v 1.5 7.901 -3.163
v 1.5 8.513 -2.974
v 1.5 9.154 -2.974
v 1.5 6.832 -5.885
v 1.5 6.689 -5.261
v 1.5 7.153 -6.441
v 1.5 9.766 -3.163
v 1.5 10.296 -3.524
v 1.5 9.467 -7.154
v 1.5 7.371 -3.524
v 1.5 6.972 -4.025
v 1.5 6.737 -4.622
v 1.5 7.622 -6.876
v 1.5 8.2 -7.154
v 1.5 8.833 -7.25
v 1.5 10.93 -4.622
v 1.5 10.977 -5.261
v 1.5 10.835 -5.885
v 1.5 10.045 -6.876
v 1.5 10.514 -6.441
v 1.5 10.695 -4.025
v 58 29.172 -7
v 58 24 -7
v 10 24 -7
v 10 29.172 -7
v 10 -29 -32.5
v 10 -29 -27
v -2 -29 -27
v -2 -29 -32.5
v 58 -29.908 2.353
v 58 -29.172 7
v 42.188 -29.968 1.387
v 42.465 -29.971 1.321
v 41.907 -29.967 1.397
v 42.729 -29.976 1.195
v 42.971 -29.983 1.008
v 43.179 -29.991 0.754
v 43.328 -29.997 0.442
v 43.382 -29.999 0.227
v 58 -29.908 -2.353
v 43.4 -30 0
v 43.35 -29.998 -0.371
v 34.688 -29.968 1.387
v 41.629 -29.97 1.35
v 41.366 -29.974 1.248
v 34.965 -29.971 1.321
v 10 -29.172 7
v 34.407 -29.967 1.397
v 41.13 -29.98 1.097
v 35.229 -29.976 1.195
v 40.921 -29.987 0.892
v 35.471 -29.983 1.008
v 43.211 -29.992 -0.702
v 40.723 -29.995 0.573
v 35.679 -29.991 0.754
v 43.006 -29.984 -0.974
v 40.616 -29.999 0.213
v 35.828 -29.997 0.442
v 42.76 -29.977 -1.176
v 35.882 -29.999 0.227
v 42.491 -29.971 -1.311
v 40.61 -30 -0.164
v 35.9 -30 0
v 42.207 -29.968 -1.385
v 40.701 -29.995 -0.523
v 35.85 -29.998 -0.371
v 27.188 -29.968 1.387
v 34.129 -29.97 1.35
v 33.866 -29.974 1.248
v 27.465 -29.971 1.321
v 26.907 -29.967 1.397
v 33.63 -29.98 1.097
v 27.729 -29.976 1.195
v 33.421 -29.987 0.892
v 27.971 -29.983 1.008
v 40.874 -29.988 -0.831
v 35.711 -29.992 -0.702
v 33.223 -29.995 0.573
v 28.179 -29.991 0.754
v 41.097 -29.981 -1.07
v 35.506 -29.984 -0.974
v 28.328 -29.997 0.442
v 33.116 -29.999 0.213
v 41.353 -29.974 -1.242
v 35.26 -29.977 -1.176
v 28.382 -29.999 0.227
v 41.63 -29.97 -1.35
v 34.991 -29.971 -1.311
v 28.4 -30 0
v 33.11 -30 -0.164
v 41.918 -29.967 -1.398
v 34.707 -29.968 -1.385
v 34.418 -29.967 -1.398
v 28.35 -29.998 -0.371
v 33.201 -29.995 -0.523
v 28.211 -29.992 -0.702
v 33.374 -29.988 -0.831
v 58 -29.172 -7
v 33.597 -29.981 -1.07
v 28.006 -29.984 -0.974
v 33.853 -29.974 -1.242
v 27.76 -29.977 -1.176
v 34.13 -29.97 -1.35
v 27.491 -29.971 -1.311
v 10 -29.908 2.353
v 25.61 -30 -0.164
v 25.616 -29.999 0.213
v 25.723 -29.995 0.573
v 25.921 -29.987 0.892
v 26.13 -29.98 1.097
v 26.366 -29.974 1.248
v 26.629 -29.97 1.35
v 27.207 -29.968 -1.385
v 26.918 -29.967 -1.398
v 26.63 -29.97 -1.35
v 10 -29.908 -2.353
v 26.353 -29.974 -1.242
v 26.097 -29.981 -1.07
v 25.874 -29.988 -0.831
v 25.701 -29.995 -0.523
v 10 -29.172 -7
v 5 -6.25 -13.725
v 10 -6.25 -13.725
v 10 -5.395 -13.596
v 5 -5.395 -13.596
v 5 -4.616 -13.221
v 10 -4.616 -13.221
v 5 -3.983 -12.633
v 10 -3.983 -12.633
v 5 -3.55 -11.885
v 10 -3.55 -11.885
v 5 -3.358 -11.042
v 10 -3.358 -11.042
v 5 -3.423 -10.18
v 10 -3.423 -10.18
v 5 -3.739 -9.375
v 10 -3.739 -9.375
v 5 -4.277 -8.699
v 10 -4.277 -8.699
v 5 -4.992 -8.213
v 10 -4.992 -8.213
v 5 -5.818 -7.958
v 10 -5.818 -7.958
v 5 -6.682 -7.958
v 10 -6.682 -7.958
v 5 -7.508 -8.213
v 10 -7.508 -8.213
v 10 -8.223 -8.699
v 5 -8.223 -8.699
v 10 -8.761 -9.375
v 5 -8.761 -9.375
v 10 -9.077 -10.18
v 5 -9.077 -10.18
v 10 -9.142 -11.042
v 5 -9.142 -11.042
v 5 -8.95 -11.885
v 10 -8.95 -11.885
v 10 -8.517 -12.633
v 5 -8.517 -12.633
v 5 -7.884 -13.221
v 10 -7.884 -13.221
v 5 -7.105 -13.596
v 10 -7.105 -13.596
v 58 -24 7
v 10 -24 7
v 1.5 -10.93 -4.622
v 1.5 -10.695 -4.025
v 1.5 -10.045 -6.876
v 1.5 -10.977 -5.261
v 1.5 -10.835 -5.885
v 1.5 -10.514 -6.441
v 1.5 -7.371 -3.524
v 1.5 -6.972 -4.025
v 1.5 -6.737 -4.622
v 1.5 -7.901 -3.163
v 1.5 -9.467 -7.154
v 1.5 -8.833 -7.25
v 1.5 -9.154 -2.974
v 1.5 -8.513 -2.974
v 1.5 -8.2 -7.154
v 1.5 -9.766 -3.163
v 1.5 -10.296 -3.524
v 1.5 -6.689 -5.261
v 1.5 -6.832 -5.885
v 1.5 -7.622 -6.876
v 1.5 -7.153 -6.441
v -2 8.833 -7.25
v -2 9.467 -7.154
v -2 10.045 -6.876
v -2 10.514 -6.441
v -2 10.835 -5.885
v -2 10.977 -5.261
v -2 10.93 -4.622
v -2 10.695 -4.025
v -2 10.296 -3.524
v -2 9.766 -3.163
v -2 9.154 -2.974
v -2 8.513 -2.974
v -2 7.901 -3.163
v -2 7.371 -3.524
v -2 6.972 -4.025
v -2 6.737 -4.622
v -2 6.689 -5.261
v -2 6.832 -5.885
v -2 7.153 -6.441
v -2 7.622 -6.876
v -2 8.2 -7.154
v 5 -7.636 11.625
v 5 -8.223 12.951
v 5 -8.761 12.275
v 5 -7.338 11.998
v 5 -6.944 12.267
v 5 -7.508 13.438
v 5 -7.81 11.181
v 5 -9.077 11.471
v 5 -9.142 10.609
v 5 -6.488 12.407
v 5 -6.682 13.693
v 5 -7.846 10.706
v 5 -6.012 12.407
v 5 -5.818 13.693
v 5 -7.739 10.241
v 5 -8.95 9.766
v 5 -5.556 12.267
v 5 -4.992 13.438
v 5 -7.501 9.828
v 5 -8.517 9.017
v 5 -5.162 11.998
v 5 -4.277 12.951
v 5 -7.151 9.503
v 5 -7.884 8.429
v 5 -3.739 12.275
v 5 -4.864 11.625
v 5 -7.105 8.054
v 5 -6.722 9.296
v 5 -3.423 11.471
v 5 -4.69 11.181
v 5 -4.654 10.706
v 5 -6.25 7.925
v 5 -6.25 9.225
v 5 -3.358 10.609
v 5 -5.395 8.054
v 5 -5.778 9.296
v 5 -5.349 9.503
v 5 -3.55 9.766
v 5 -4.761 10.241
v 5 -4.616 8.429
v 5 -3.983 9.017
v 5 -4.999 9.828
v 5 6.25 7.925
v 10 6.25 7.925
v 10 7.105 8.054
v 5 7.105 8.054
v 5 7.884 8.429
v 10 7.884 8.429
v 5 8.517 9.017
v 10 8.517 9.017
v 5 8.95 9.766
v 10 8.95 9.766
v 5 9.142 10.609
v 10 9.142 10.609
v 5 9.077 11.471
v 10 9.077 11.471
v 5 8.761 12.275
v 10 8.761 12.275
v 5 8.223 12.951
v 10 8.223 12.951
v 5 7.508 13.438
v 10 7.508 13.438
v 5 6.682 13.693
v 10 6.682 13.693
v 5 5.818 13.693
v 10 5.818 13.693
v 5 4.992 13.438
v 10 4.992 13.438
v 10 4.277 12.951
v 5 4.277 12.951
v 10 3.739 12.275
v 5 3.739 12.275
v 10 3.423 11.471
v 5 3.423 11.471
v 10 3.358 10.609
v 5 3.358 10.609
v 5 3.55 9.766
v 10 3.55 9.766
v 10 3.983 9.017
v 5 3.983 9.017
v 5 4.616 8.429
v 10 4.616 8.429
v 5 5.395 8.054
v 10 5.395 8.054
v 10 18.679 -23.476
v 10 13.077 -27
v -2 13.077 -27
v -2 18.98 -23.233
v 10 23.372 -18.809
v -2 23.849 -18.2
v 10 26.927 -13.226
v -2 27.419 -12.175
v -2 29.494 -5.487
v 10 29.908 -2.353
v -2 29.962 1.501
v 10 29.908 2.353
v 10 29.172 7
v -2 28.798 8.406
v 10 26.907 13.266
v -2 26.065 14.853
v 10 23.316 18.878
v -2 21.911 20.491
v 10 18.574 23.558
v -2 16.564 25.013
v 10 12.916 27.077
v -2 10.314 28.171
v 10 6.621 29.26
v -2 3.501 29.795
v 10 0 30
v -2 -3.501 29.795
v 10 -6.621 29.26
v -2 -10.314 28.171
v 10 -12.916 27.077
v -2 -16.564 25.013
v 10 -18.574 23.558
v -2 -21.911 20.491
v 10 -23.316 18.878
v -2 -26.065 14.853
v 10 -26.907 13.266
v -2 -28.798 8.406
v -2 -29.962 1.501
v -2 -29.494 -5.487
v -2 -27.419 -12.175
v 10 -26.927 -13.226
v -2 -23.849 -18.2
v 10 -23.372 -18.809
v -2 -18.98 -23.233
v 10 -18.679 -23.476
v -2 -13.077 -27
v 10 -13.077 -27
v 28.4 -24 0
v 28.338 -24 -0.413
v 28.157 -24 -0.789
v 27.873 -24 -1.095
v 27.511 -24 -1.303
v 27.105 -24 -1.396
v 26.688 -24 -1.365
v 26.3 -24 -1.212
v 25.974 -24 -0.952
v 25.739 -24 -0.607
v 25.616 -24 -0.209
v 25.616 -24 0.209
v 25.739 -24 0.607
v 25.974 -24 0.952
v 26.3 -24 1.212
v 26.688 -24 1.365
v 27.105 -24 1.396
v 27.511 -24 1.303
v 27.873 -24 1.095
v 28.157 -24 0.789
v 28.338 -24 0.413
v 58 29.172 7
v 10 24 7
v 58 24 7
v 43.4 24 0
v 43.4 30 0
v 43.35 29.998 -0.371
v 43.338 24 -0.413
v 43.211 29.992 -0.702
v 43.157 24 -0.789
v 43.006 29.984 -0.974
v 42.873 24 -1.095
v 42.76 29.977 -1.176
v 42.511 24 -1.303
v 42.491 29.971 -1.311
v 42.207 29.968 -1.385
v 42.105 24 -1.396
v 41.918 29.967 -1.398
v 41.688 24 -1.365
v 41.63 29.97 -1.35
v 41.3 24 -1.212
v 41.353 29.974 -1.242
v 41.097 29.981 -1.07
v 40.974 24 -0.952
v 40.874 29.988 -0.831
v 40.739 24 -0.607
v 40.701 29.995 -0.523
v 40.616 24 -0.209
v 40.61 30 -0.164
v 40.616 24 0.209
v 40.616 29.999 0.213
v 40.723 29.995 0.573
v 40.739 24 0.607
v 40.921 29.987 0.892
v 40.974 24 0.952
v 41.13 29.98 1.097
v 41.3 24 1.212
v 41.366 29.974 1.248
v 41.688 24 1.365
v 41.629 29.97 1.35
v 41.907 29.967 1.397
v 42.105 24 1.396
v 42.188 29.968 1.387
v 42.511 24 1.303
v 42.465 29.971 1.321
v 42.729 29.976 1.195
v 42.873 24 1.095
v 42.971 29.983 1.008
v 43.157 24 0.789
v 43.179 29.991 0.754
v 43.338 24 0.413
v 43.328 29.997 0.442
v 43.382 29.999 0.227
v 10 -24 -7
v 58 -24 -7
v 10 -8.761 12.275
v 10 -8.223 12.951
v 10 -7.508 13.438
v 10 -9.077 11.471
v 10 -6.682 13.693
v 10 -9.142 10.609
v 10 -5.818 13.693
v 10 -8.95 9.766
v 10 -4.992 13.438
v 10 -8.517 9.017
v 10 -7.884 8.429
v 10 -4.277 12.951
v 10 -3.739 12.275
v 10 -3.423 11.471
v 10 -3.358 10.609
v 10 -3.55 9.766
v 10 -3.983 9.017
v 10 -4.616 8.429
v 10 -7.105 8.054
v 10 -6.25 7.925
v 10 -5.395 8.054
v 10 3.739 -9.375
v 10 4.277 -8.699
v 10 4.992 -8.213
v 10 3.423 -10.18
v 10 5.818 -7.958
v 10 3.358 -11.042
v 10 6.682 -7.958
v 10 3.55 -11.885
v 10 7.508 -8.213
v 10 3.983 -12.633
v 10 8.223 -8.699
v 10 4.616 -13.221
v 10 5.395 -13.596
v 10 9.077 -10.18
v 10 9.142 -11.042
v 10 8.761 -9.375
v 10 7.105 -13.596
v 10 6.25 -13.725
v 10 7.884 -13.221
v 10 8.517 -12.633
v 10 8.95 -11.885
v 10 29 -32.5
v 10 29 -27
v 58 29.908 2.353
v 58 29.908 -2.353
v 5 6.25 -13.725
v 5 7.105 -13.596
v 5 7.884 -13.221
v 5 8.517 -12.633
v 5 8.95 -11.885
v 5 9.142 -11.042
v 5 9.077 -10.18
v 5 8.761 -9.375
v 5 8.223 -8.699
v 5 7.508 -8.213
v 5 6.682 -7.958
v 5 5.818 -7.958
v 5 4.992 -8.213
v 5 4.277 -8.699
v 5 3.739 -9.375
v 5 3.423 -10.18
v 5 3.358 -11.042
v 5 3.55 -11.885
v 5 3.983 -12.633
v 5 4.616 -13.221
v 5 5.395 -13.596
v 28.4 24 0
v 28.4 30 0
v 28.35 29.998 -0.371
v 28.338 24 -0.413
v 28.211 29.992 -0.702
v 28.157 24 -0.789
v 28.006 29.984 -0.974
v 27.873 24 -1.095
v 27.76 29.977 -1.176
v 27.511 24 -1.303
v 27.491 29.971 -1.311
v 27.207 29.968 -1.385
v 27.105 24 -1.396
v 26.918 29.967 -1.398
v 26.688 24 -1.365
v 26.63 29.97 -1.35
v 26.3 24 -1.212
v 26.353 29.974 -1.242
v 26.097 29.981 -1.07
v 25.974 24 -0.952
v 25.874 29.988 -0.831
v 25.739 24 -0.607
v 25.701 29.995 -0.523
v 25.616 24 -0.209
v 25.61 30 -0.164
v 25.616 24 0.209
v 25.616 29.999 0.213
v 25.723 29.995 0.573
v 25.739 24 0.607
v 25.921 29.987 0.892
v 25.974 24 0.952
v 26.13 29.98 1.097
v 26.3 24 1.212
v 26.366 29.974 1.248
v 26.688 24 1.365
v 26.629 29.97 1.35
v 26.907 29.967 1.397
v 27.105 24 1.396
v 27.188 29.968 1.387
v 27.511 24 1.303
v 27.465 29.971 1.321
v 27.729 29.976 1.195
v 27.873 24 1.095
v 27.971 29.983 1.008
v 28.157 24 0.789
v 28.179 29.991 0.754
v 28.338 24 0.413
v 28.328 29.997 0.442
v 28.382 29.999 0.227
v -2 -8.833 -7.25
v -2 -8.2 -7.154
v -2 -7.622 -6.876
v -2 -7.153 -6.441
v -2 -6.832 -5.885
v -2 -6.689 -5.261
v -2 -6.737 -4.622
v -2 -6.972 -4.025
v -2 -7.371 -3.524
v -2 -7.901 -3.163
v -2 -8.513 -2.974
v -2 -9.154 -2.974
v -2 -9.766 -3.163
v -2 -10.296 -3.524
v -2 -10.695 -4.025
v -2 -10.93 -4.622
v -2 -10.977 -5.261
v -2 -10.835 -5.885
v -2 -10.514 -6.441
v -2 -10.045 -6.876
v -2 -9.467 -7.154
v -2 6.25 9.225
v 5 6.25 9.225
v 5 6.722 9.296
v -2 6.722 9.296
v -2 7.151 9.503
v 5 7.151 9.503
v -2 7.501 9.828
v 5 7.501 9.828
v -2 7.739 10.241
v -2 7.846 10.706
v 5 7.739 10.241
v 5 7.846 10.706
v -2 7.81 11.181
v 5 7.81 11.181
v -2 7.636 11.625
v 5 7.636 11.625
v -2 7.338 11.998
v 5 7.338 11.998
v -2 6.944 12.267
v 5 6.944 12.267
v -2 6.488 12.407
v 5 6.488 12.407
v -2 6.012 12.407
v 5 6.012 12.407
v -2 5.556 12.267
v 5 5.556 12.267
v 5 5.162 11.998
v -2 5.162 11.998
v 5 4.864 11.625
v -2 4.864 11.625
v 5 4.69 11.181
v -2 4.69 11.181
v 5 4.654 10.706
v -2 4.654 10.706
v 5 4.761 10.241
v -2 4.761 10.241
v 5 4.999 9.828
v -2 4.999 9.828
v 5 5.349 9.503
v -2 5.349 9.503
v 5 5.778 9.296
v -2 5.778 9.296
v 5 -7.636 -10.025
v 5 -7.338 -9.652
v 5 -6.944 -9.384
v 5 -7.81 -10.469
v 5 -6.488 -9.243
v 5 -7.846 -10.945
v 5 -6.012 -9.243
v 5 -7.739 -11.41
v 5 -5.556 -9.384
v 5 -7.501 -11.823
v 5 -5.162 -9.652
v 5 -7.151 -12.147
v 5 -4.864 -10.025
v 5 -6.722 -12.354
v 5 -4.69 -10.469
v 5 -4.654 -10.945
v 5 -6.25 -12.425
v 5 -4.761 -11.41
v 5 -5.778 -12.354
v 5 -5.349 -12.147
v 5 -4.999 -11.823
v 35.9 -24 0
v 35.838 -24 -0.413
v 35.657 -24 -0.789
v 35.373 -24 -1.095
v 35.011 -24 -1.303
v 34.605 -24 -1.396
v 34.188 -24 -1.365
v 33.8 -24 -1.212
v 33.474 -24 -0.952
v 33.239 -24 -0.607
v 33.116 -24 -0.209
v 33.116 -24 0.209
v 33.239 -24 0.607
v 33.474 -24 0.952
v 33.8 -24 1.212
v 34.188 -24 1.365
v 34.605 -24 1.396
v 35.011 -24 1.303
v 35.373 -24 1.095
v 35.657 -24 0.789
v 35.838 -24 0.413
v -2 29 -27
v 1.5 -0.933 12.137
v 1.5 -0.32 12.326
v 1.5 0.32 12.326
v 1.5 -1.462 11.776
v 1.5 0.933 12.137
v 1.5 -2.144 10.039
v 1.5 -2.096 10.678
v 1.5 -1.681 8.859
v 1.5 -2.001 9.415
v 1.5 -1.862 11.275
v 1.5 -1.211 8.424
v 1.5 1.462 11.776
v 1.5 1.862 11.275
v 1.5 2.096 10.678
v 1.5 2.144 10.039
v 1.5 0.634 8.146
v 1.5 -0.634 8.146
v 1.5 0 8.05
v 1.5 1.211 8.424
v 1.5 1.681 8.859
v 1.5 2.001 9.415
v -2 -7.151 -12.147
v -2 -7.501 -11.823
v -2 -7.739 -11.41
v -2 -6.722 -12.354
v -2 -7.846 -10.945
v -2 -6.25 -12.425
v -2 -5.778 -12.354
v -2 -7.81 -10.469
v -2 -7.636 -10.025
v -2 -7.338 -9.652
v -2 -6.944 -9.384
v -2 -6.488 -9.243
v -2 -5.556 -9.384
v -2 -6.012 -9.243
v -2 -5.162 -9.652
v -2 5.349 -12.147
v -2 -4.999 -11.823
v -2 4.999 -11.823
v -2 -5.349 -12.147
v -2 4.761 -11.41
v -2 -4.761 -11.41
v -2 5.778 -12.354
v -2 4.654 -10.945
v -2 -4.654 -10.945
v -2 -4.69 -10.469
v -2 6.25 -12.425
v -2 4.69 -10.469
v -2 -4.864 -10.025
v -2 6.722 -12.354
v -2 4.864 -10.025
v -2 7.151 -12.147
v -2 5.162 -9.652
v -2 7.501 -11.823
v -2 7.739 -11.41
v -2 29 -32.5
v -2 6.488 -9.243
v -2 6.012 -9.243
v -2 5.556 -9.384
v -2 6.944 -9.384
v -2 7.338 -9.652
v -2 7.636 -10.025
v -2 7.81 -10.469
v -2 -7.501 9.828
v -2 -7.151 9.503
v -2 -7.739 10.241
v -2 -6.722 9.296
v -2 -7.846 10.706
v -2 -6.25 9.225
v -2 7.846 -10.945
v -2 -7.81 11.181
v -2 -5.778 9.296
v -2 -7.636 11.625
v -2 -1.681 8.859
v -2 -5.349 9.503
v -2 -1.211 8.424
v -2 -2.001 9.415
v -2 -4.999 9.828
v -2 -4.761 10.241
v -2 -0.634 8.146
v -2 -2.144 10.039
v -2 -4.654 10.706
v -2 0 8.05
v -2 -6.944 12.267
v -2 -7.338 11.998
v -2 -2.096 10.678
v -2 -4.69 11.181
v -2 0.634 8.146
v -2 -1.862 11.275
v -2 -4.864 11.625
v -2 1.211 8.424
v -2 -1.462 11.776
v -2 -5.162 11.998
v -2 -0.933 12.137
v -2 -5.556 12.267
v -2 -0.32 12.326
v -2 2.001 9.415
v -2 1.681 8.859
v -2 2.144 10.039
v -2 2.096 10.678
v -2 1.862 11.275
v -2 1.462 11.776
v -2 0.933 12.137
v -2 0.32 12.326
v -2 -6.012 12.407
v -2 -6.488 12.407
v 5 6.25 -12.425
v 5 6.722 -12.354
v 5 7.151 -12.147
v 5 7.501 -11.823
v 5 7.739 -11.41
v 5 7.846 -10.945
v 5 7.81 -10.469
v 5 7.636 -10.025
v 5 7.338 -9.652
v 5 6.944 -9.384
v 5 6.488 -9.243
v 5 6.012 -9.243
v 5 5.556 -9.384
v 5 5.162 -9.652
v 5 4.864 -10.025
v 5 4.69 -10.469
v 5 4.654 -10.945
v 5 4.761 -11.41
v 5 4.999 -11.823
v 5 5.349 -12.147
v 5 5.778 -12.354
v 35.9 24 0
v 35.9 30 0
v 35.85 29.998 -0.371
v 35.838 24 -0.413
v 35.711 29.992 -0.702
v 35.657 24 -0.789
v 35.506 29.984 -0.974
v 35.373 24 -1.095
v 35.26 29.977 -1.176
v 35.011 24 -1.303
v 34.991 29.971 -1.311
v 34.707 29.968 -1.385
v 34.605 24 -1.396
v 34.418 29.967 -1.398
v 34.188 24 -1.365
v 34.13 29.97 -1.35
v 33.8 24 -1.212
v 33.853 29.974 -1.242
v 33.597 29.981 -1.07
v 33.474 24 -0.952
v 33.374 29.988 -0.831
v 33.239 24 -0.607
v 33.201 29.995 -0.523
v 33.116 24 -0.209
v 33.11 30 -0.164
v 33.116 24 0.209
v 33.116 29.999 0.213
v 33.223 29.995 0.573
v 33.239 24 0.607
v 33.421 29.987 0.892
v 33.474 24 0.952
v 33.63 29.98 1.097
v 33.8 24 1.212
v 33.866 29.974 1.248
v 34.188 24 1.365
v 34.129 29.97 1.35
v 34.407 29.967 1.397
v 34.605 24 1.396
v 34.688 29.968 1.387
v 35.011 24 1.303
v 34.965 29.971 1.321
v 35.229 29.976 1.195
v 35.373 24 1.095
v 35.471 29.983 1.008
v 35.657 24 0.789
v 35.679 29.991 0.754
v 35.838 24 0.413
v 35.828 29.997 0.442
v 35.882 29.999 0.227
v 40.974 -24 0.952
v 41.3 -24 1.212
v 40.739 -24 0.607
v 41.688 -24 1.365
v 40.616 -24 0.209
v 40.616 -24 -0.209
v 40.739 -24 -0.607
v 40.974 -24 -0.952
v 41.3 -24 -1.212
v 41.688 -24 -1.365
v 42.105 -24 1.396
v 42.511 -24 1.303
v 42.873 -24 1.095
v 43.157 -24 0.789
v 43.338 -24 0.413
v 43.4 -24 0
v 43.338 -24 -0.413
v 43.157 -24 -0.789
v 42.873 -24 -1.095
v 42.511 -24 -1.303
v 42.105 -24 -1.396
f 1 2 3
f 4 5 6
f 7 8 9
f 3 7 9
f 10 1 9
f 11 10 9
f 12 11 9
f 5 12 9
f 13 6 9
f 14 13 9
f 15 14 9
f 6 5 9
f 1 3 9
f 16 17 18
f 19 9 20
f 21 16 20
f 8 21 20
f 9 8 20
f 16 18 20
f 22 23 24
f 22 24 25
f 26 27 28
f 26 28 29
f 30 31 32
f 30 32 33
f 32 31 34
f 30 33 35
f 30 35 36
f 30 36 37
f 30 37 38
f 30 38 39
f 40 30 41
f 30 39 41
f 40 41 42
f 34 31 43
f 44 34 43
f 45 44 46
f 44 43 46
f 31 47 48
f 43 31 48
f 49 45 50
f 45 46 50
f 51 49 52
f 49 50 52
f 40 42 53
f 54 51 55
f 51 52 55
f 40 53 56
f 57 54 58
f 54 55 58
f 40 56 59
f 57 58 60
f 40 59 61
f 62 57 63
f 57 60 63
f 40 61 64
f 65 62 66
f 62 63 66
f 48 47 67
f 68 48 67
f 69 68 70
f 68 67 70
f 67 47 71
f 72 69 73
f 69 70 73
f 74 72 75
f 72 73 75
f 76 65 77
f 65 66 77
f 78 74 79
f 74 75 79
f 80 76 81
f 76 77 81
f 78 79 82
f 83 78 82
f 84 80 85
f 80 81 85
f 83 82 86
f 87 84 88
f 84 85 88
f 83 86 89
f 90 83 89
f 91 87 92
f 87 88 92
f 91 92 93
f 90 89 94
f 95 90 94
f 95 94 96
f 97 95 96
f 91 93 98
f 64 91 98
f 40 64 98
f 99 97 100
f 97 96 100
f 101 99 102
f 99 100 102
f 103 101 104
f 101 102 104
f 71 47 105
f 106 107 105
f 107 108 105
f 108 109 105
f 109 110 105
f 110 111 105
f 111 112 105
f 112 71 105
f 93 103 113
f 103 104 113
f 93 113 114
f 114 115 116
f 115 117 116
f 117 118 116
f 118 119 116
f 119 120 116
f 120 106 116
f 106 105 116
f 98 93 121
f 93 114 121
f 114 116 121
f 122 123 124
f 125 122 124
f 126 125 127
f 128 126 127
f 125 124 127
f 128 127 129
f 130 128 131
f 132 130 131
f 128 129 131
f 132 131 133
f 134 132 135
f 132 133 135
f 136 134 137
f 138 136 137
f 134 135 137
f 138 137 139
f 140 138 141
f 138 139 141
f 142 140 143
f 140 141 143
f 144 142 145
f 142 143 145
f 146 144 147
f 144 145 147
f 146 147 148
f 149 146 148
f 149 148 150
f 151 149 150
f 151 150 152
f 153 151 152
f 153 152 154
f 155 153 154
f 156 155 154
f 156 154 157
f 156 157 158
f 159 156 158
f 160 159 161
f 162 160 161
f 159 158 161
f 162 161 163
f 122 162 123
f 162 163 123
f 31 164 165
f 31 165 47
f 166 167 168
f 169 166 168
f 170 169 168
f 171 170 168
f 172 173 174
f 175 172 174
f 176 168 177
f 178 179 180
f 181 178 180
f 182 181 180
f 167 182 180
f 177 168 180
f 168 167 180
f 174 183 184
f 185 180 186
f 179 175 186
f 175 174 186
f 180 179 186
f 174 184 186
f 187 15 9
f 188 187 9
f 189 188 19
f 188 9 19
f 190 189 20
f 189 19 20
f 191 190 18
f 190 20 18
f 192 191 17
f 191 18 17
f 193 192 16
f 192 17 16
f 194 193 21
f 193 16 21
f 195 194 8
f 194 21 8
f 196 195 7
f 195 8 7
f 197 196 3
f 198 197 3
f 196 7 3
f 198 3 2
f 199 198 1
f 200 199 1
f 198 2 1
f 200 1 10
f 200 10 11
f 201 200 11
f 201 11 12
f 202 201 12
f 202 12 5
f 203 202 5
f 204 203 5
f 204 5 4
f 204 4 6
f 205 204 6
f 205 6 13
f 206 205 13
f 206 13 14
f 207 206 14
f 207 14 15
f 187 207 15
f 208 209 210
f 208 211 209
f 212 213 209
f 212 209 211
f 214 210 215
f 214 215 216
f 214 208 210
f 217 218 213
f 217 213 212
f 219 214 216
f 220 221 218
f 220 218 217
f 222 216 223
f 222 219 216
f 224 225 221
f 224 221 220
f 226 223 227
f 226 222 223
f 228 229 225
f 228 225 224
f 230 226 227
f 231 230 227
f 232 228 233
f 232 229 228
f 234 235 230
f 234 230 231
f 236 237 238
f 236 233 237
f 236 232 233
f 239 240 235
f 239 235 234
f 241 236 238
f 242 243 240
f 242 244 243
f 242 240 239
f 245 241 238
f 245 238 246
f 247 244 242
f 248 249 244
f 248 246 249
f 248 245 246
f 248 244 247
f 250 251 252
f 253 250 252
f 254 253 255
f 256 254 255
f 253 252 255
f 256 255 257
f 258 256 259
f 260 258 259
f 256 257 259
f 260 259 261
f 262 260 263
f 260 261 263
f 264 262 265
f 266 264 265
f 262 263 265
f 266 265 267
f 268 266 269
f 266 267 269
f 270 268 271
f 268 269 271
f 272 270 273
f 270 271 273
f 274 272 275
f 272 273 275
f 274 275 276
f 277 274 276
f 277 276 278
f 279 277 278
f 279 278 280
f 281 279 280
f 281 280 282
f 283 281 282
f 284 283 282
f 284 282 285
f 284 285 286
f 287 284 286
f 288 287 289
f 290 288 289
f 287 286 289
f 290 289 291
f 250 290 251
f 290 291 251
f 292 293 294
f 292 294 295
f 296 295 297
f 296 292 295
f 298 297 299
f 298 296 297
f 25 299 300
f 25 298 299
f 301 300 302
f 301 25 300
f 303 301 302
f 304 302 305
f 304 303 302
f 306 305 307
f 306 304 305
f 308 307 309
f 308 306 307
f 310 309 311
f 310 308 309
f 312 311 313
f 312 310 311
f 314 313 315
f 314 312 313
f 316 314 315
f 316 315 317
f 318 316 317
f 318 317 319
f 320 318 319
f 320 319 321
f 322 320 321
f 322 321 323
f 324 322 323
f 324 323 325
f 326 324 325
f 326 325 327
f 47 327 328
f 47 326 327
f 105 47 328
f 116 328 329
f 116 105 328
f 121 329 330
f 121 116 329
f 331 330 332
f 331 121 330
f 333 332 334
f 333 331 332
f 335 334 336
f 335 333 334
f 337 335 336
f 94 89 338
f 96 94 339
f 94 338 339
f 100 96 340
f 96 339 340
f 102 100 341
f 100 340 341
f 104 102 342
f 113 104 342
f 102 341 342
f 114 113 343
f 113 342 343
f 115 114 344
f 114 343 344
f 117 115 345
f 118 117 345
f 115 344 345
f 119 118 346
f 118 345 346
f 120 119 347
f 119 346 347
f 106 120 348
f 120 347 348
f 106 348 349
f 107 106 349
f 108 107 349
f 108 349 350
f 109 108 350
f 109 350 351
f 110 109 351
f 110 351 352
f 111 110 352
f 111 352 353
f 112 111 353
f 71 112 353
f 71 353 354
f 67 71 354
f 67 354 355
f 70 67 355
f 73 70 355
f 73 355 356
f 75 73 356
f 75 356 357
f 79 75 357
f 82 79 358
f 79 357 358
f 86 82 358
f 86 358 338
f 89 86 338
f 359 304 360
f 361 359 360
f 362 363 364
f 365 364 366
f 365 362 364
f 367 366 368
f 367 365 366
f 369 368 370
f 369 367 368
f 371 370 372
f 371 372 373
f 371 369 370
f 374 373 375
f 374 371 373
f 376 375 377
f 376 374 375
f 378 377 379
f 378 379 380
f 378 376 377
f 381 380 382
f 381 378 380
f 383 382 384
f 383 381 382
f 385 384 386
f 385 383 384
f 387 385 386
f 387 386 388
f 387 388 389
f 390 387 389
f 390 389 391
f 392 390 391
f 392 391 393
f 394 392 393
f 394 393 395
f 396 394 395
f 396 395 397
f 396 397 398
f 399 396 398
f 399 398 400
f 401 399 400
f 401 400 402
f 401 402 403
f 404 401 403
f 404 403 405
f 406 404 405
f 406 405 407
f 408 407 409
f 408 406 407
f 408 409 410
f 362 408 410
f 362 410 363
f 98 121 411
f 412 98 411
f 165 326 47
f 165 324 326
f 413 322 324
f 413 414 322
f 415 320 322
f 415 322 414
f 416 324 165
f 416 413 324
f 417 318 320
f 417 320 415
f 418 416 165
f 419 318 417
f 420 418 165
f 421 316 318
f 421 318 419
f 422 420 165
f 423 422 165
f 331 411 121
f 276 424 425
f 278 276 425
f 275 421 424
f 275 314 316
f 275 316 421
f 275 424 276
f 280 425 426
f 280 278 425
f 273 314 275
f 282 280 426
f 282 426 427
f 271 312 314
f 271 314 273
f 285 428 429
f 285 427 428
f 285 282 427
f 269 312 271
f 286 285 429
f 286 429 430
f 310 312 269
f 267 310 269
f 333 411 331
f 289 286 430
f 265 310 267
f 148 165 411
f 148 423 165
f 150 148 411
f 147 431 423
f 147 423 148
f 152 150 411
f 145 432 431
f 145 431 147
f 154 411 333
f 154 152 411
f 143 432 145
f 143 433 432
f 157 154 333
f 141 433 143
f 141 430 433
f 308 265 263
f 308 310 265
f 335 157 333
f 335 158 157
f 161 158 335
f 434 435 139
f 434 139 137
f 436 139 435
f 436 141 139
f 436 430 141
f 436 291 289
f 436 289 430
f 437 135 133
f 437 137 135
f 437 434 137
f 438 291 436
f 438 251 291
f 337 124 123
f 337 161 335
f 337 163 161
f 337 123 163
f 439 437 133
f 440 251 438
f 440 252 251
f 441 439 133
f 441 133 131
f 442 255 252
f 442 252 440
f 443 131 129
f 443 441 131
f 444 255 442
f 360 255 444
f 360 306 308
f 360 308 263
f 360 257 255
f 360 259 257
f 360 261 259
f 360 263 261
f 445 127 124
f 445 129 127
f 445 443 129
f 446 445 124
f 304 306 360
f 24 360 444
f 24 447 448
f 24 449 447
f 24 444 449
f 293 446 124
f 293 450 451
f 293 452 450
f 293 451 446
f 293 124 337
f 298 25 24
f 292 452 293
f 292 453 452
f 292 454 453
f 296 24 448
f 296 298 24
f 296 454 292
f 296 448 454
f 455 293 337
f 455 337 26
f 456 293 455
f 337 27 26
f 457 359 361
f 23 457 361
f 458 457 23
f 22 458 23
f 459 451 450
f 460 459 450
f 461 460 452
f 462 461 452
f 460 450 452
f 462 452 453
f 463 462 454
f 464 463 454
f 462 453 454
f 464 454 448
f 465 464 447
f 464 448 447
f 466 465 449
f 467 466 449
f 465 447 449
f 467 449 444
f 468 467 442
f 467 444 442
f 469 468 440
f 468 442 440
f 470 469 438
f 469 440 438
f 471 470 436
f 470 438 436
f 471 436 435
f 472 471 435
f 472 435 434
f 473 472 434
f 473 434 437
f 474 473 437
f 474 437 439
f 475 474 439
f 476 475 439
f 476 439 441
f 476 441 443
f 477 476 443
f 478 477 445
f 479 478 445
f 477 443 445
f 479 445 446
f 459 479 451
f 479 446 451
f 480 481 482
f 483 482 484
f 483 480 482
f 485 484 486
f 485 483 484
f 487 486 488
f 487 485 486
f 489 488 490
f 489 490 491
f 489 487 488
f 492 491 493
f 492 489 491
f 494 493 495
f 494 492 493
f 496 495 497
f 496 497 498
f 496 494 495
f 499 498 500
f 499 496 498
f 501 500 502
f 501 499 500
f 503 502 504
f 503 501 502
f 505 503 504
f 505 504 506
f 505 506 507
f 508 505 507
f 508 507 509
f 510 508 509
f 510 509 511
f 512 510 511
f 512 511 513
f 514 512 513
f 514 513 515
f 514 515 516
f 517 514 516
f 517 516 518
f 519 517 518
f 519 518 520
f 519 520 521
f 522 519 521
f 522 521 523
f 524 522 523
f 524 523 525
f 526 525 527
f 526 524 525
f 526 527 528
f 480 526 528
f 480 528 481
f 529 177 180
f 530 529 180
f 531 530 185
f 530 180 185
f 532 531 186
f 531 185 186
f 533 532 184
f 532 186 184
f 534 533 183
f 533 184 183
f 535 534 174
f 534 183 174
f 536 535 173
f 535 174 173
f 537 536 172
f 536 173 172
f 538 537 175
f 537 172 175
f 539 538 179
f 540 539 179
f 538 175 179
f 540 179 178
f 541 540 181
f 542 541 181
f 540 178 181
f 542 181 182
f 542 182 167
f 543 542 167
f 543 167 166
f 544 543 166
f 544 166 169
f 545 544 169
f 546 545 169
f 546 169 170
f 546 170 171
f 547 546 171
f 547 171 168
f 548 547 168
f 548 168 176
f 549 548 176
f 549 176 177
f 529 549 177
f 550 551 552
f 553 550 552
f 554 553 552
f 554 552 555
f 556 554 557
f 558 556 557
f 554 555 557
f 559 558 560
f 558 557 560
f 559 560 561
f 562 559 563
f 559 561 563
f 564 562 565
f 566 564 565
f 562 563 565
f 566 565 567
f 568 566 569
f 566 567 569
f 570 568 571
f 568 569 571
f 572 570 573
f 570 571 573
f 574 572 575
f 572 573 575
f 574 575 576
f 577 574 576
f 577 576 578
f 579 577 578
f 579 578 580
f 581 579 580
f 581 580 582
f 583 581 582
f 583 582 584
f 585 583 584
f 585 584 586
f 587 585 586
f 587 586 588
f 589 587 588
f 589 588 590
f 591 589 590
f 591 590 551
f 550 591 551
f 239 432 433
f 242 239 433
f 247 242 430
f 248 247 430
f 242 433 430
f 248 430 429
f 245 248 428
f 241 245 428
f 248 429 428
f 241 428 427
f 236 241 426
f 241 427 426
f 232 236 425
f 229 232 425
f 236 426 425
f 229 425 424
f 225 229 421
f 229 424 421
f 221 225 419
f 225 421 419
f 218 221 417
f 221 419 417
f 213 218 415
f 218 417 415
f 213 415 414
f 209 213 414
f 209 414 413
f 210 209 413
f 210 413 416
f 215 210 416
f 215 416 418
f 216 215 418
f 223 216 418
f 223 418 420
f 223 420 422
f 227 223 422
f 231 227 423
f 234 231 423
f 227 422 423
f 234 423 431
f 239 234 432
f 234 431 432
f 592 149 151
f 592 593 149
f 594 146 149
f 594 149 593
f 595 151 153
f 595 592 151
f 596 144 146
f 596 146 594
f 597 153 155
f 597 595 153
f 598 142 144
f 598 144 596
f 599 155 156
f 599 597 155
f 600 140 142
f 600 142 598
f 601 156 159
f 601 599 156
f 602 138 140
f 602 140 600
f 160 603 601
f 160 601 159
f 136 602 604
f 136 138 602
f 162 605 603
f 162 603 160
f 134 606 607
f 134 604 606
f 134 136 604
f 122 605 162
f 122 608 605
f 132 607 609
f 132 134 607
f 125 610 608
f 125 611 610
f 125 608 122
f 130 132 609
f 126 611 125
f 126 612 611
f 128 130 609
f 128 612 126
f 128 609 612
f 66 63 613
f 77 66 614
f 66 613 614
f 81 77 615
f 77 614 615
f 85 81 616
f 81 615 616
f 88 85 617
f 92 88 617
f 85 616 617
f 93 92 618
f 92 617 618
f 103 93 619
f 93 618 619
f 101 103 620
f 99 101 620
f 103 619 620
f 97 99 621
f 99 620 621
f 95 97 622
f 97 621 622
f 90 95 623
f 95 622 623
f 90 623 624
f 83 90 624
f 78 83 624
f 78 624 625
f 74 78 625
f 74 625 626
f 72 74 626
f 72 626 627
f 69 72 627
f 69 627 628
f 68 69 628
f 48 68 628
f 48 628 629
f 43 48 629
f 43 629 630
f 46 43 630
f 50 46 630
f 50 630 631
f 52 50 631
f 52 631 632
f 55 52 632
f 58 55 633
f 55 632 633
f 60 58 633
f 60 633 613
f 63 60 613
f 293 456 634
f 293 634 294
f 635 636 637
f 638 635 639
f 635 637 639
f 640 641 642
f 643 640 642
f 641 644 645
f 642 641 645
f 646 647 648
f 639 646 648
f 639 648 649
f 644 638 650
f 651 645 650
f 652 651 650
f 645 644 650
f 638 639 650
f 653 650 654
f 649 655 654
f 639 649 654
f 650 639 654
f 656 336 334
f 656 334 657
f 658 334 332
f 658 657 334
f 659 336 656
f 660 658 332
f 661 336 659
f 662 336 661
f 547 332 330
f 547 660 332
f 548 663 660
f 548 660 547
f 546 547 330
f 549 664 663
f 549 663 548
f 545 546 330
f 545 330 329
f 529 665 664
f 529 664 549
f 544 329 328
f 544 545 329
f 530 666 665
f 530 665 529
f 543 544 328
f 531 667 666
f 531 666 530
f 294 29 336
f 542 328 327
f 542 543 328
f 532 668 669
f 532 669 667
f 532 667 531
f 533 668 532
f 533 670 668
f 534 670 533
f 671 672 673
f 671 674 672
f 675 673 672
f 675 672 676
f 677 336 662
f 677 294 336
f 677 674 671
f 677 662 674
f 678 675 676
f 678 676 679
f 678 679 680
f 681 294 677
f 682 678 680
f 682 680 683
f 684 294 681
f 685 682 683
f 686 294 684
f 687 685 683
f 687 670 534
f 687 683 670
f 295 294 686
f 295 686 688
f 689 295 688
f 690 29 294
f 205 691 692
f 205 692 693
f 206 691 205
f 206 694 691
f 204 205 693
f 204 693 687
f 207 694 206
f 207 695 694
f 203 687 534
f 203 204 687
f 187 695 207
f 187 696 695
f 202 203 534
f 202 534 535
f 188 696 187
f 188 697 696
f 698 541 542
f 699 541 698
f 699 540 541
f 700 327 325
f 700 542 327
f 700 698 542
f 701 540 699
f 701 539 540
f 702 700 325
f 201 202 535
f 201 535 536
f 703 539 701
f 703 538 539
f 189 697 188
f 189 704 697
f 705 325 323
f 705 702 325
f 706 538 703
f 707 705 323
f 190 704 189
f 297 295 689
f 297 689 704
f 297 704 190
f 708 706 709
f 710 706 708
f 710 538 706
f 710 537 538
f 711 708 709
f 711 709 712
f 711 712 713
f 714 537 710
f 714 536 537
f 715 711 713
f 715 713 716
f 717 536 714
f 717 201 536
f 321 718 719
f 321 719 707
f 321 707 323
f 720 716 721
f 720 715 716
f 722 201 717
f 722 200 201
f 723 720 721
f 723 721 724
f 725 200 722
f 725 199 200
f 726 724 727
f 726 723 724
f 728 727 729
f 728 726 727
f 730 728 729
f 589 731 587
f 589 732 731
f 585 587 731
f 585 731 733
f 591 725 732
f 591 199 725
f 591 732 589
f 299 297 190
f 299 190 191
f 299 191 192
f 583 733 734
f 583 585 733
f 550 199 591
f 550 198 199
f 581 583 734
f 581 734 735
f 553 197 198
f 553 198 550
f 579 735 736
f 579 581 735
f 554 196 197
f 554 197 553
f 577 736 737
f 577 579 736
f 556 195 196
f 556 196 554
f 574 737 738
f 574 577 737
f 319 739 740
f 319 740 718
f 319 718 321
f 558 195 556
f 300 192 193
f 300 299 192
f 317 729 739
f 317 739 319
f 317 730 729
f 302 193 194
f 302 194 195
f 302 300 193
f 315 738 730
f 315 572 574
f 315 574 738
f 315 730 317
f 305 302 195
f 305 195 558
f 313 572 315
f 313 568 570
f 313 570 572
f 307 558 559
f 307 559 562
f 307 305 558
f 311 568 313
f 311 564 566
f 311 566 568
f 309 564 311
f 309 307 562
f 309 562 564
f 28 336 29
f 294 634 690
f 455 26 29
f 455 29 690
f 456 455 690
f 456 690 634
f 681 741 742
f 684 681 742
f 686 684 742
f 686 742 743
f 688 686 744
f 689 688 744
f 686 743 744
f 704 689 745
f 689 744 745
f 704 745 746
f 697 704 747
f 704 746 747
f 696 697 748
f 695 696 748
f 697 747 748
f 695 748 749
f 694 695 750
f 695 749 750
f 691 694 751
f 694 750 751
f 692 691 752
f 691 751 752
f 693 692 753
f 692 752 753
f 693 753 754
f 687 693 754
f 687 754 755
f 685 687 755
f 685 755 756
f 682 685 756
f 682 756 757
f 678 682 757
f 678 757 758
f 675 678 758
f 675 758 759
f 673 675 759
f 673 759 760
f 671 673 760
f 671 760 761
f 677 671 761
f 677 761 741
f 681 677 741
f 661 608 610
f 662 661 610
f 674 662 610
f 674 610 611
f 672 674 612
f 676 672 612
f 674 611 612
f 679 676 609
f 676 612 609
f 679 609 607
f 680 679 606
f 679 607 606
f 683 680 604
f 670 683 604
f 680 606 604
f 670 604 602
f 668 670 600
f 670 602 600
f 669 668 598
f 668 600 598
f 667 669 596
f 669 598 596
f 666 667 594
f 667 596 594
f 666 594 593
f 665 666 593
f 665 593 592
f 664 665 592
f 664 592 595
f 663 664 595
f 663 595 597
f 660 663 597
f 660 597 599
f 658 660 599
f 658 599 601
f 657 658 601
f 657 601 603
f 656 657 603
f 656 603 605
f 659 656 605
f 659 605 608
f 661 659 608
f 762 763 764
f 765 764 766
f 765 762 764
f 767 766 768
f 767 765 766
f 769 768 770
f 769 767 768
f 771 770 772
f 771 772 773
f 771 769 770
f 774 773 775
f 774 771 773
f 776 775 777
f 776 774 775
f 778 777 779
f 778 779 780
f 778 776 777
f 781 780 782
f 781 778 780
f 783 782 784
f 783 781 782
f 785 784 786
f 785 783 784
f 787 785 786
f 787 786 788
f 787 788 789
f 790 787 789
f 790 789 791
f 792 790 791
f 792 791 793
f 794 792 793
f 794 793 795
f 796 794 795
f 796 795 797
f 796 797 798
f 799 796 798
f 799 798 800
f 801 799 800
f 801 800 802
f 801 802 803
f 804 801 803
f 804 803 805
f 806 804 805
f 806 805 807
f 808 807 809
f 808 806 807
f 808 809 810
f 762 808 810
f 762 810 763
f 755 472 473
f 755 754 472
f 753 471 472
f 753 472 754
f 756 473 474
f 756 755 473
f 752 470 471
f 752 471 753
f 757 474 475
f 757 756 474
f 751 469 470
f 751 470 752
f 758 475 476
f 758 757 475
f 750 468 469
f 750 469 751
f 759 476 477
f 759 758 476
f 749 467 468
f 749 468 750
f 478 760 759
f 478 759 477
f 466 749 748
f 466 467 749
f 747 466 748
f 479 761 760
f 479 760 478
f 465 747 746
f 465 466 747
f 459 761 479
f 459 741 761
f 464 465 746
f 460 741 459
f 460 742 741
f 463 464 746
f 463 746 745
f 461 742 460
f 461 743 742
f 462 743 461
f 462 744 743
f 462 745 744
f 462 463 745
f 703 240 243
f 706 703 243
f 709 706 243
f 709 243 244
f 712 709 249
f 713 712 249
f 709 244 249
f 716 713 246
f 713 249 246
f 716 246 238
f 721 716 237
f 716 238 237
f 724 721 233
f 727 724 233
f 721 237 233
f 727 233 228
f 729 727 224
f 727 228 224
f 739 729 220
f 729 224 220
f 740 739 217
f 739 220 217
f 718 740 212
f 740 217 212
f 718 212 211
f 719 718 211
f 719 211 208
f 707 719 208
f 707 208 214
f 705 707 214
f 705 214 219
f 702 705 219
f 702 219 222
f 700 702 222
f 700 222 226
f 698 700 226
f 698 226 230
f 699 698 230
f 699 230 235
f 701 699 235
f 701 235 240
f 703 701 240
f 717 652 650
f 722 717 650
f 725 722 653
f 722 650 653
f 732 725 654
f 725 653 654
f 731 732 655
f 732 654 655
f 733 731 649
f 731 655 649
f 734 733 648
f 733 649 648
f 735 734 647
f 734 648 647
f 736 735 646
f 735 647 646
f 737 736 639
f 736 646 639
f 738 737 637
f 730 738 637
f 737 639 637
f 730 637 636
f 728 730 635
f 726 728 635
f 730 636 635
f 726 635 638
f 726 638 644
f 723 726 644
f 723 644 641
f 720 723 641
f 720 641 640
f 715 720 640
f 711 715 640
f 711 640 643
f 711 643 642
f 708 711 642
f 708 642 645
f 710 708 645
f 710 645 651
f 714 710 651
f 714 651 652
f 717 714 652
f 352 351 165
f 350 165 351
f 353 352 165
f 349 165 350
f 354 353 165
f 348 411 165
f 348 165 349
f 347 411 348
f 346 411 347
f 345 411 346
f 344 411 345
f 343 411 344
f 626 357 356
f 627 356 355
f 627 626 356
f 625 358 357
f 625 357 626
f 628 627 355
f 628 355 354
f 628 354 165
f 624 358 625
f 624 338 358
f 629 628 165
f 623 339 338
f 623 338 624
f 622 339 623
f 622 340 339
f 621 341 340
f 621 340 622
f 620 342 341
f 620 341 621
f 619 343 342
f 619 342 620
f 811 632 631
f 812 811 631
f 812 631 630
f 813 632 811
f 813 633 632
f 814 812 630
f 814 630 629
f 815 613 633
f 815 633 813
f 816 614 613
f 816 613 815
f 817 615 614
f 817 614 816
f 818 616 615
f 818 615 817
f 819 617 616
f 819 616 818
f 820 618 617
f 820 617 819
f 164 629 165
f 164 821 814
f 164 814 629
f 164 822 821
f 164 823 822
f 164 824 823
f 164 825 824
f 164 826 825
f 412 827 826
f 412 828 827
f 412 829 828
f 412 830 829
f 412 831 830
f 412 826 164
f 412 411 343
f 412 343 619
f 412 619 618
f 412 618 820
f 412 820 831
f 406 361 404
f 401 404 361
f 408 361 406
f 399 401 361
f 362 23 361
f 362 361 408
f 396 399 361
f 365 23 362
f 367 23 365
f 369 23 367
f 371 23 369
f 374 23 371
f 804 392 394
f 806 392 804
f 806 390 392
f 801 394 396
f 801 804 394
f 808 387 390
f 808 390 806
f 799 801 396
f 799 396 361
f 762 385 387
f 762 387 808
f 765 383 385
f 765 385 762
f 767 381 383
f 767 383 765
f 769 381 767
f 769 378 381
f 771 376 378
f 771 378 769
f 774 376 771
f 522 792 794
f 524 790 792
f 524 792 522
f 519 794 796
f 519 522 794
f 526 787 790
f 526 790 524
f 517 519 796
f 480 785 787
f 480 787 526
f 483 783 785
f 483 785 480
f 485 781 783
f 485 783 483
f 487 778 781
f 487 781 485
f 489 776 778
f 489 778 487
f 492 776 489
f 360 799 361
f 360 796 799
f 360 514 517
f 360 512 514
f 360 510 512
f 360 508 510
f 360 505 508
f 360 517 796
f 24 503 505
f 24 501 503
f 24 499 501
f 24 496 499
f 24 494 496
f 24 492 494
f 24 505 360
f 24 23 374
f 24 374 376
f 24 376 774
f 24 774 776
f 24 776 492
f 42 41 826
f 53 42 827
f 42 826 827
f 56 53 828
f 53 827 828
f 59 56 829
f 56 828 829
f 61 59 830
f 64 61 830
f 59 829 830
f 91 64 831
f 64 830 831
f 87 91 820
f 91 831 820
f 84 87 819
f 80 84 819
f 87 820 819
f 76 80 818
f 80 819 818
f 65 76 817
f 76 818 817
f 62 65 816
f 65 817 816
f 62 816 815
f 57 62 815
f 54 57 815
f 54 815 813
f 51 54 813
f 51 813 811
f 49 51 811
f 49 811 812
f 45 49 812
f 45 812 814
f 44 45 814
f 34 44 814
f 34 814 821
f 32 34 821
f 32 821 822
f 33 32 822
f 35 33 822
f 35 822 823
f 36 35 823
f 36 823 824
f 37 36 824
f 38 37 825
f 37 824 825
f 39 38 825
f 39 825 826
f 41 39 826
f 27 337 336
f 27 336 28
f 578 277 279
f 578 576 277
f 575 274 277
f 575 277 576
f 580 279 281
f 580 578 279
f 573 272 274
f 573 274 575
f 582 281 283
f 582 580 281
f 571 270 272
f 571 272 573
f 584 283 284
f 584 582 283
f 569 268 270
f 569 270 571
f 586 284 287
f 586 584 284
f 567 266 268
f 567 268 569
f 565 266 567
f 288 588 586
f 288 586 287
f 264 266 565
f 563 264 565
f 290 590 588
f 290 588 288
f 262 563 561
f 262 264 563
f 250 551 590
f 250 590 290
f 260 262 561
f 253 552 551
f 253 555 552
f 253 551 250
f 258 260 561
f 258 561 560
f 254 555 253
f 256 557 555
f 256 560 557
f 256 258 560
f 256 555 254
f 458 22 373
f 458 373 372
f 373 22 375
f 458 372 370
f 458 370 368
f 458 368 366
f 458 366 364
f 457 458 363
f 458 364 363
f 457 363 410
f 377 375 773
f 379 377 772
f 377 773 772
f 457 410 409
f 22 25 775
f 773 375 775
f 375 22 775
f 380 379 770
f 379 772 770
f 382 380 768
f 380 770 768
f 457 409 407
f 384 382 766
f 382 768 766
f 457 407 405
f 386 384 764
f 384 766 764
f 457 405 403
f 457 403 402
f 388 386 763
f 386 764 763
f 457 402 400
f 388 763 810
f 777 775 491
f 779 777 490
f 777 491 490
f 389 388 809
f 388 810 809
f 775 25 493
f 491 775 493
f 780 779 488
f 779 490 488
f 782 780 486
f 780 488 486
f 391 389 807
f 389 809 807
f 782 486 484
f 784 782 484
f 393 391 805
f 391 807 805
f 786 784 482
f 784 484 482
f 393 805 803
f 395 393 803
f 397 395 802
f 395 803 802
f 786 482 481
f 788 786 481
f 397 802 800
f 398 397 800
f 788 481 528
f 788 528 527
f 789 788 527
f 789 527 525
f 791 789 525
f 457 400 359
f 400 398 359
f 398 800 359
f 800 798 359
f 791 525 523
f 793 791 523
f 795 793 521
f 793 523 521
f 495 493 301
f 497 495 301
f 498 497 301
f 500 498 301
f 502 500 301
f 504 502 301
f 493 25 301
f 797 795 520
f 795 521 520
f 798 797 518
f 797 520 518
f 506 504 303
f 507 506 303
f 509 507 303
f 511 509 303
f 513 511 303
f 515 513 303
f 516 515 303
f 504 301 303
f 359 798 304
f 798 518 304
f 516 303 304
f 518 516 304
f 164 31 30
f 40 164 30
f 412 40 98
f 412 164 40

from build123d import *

# Parameters (mm, degrees)
SKETCH_23_R                      = 1.6
SKETCH_23_R_2                    = 2.15
EXTRUDE_9_DEPTH                  = 12
SKETCH_25_R                      = 3.199536645
SKETCH_25_R_2                    = 3.253572192
SKETCH_25_R_3                    = 3.504037636
EXTRUDE_11_DEPTH                 = 8.5
SKETCH_27_R                      = 2.9
CUT_EXTRUDE_14_DEPTH             = 15
CUT_EXTRUDE_14_DEPTH_BACK        = 5
EXTRUDE_14_DEPTH                 = 48
EXTRUDE_14_DEPTH_BACK            = 8.5
EXTRUDE_15_REACH                 = 62
SKETCH_30_R                      = 2.823102459
SKETCH_30_R_2                    = 3.099807243
CUT_EXTRUDE_15_DEPTH             = 38
CUT_EXTRUDE_16_REACH             = 8
SKETCH_33_R                      = 1.4
CUT_EXTRUDE_16_DIRECTION_2_REACH = 56


with BuildPart() as part:
    # 草图23 → 凸台-拉伸9 (new body)
    with BuildSketch(Plane(origin=(10, 0, 0), x_dir=(0, 0, -1), z_dir=(1, 0, 0))):
        with BuildLine():
            Line((32.5, 0), (32.5, 29))
            Line((32.5, 29), (27, 29))
            Line((27, 29), (27, 13.076696831))
            ThreePointArc((27, 13.076696831), (-30, 0), (27, -13.076696831))
            Line((27, -13.076696831), (27, -29))
            Line((27, -29), (32.5, -29))
            Line((32.5, -29), (32.5, 0))
        make_face()
        with Locations((0, 12.5)):
            Circle(SKETCH_23_R, mode=Mode.SUBTRACT)
        with Locations((-10.825317547, 6.25)):
            Circle(SKETCH_23_R, mode=Mode.SUBTRACT)
        with Locations((10.825317547, 6.25)):
            Circle(SKETCH_23_R, mode=Mode.SUBTRACT)
        with Locations((10.825317547, -6.25)):
            Circle(SKETCH_23_R, mode=Mode.SUBTRACT)
        with Locations((0, -12.5)):
            Circle(SKETCH_23_R, mode=Mode.SUBTRACT)
        with Locations((-10.825317547, -6.25)):
            Circle(SKETCH_23_R, mode=Mode.SUBTRACT)
        with Locations((5.1, 8.833459119)):
            Circle(SKETCH_23_R_2, mode=Mode.SUBTRACT)
        with Locations((-10.2, 0)):
            Circle(SKETCH_23_R_2, mode=Mode.SUBTRACT)
        with Locations((5.1, -8.833459119)):
            Circle(SKETCH_23_R_2, mode=Mode.SUBTRACT)
    extrude(amount=-EXTRUDE_9_DEPTH)

    # 草图25 → 凸台-拉伸11 (add)
    with BuildSketch(Plane(origin=(10, 0, 0), x_dir=(0, 0, -1), z_dir=(1, 0, 0))):
        with Locations((5.1, 8.833459119)):
            Circle(SKETCH_25_R)
        with Locations((-10.2, 0)):
            Circle(SKETCH_25_R_2)
        with Locations((5.1, -8.833459119)):
            Circle(SKETCH_25_R_3)
    extrude(amount=-EXTRUDE_11_DEPTH)

    # 草图27 → 切除-拉伸14 (cut, two sides)
    with BuildSketch(Plane(origin=(10, 0, 0), x_dir=(0, 0, -1), z_dir=(1, 0, 0))) as cut_extrude_14_sk:
        with Locations((0, 12.5)):
            Circle(SKETCH_27_R)
        with Locations((-86.65969357, 123.729949726)):
            Circle(SKETCH_27_R)
        with Locations((-33.661578231, 254.394420705)):
            Circle(SKETCH_27_R)
        with Locations((105.996230679, 273.828941958)):
            Circle(SKETCH_27_R)
        with Locations((192.655924249, 162.598992232)):
            Circle(SKETCH_27_R)
        with Locations((139.657808909, 31.934521253)):
            Circle(SKETCH_27_R)
        with Locations((10.825317547, 6.25)):
            Circle(SKETCH_27_R)
        with Locations((10.825317547, -6.25)):
            Circle(SKETCH_27_R)
        with Locations((0, -12.5)):
            Circle(SKETCH_27_R)
        with Locations((-10.825317547, -6.25)):
            Circle(SKETCH_27_R)
        with Locations((-10.825317547, 6.25)):
            Circle(SKETCH_27_R)
    extrude(amount=CUT_EXTRUDE_14_DEPTH, mode=Mode.SUBTRACT)
    extrude(cut_extrude_14_sk.sketch, amount=-CUT_EXTRUDE_14_DEPTH_BACK, mode=Mode.SUBTRACT)

    # 草图29 → 凸台-拉伸14 (add, two sides)
    with BuildSketch(Plane(origin=(10, 0, 0), x_dir=(0, 0, -1), z_dir=(1, 0, 0))) as extrude_14_sk:
        with BuildLine():
            Line((-7, 29.171904292), (-7, -29.171904292))
            ThreePointArc((-7, -29.171904292), (0, -30), (7, -29.171904292))
            Line((7, -29.171904292), (7, 29.171904292))
            ThreePointArc((7, 29.171904292), (0, 30), (-7, 29.171904292))
        make_face()
    extrude(amount=EXTRUDE_14_DEPTH)
    extrude(extrude_14_sk.sketch, amount=-EXTRUDE_14_DEPTH_BACK)

    # 草图30 → 凸台-拉伸15 (add, up to next)
    with BuildSketch(Plane.ZY.offset(2), mode=Mode.PRIVATE) as extrude_15_sk1:
        with Locations((0, 12.5)):
            Circle(SKETCH_30_R)
    extrude_15_tool1 = extrude(extrude_15_sk1.sketch, amount=-EXTRUDE_15_REACH, mode=Mode.PRIVATE) - part.part
    add(extrude_15_tool1.solids().sort_by_distance((-2, 12.5, 0))[0])
    # 草图30 → 凸台-拉伸15 (add, up to next)
    with BuildSketch(Plane.ZY.offset(2), mode=Mode.PRIVATE) as extrude_15_sk2:
        with Locations((0, -12.5)):
            Circle(SKETCH_30_R_2)
    extrude_15_tool2 = extrude(extrude_15_sk2.sketch, amount=-EXTRUDE_15_REACH, mode=Mode.PRIVATE) - part.part
    add(extrude_15_tool2.solids().sort_by_distance((-2, -12.5, 0))[0])

    # 草图32 → 切除-拉伸15 (cut, through all)
    with BuildSketch(Plane(origin=(0, 0, -7), x_dir=(-1, 0, 0), z_dir=(0, 0, -1))):
        Polygon((-58, 0), (-58, 24), (-10, 24), (-10, -24), (-58, -24), align=None)
    extrude(amount=-CUT_EXTRUDE_15_DEPTH, mode=Mode.SUBTRACT)

    # 草图33 → 切除-拉伸16 (cut, up to next)
    with BuildSketch(Plane(origin=(0, -24, 0), x_dir=(1, 0, 0), z_dir=(0, 1, 0)), mode=Mode.PRIVATE) as cut_extrude_16_sk1:
        with Locations((34.5, 0)):
            Circle(SKETCH_33_R)
    cut_extrude_16_tool1 = extrude(cut_extrude_16_sk1.sketch, amount=-CUT_EXTRUDE_16_REACH, mode=Mode.PRIVATE) & part.part
    add(cut_extrude_16_tool1.solids().sort_by_distance((34.5, -24, 0))[0], mode=Mode.SUBTRACT)
    # 草图33 → 切除-拉伸16 (cut, up to next)
    with BuildSketch(Plane(origin=(0, -24, 0), x_dir=(1, 0, 0), z_dir=(0, 1, 0)), mode=Mode.PRIVATE) as cut_extrude_16_sk2:
        with Locations((42, 0)):
            Circle(SKETCH_33_R)
    cut_extrude_16_tool2 = extrude(cut_extrude_16_sk2.sketch, amount=-CUT_EXTRUDE_16_REACH, mode=Mode.PRIVATE) & part.part
    add(cut_extrude_16_tool2.solids().sort_by_distance((42, -24, 0))[0], mode=Mode.SUBTRACT)
    # 草图33 → 切除-拉伸16 (cut, up to next)
    with BuildSketch(Plane(origin=(0, -24, 0), x_dir=(1, 0, 0), z_dir=(0, 1, 0)), mode=Mode.PRIVATE) as cut_extrude_16_sk3:
        with Locations((27, 0)):
            Circle(SKETCH_33_R)
    cut_extrude_16_tool3 = extrude(cut_extrude_16_sk3.sketch, amount=-CUT_EXTRUDE_16_REACH, mode=Mode.PRIVATE) & part.part
    add(cut_extrude_16_tool3.solids().sort_by_distance((27, -24, 0))[0], mode=Mode.SUBTRACT)

    # 草图33 → 切除-拉伸16 direction 2 (cut, up to next)
    with BuildSketch(Plane(origin=(0, -24, 0), x_dir=(1, 0, 0), z_dir=(0, 1, 0)), mode=Mode.PRIVATE) as cut_extrude_16_direction_2_sk1:
        with Locations((34.5, 0)):
            Circle(SKETCH_33_R)
    cut_extrude_16_direction_2_tool1 = extrude(cut_extrude_16_direction_2_sk1.sketch, amount=CUT_EXTRUDE_16_DIRECTION_2_REACH, mode=Mode.PRIVATE) & part.part
    add(cut_extrude_16_direction_2_tool1.solids().sort_by_distance((34.5, -24, 0))[0], mode=Mode.SUBTRACT)
    # 草图33 → 切除-拉伸16 direction 2 (cut, up to next)
    with BuildSketch(Plane(origin=(0, -24, 0), x_dir=(1, 0, 0), z_dir=(0, 1, 0)), mode=Mode.PRIVATE) as cut_extrude_16_direction_2_sk2:
        with Locations((42, 0)):
            Circle(SKETCH_33_R)
    cut_extrude_16_direction_2_tool2 = extrude(cut_extrude_16_direction_2_sk2.sketch, amount=CUT_EXTRUDE_16_DIRECTION_2_REACH, mode=Mode.PRIVATE) & part.part
    add(cut_extrude_16_direction_2_tool2.solids().sort_by_distance((42, -24, 0))[0], mode=Mode.SUBTRACT)
    # 草图33 → 切除-拉伸16 direction 2 (cut, up to next)
    with BuildSketch(Plane(origin=(0, -24, 0), x_dir=(1, 0, 0), z_dir=(0, 1, 0)), mode=Mode.PRIVATE) as cut_extrude_16_direction_2_sk3:
        with Locations((27, 0)):
            Circle(SKETCH_33_R)
    cut_extrude_16_direction_2_tool3 = extrude(cut_extrude_16_direction_2_sk3.sketch, amount=CUT_EXTRUDE_16_DIRECTION_2_REACH, mode=Mode.PRIVATE) & part.part
    add(cut_extrude_16_direction_2_tool3.solids().sort_by_distance((27, -24, 0))[0], mode=Mode.SUBTRACT)


solid = part.part
